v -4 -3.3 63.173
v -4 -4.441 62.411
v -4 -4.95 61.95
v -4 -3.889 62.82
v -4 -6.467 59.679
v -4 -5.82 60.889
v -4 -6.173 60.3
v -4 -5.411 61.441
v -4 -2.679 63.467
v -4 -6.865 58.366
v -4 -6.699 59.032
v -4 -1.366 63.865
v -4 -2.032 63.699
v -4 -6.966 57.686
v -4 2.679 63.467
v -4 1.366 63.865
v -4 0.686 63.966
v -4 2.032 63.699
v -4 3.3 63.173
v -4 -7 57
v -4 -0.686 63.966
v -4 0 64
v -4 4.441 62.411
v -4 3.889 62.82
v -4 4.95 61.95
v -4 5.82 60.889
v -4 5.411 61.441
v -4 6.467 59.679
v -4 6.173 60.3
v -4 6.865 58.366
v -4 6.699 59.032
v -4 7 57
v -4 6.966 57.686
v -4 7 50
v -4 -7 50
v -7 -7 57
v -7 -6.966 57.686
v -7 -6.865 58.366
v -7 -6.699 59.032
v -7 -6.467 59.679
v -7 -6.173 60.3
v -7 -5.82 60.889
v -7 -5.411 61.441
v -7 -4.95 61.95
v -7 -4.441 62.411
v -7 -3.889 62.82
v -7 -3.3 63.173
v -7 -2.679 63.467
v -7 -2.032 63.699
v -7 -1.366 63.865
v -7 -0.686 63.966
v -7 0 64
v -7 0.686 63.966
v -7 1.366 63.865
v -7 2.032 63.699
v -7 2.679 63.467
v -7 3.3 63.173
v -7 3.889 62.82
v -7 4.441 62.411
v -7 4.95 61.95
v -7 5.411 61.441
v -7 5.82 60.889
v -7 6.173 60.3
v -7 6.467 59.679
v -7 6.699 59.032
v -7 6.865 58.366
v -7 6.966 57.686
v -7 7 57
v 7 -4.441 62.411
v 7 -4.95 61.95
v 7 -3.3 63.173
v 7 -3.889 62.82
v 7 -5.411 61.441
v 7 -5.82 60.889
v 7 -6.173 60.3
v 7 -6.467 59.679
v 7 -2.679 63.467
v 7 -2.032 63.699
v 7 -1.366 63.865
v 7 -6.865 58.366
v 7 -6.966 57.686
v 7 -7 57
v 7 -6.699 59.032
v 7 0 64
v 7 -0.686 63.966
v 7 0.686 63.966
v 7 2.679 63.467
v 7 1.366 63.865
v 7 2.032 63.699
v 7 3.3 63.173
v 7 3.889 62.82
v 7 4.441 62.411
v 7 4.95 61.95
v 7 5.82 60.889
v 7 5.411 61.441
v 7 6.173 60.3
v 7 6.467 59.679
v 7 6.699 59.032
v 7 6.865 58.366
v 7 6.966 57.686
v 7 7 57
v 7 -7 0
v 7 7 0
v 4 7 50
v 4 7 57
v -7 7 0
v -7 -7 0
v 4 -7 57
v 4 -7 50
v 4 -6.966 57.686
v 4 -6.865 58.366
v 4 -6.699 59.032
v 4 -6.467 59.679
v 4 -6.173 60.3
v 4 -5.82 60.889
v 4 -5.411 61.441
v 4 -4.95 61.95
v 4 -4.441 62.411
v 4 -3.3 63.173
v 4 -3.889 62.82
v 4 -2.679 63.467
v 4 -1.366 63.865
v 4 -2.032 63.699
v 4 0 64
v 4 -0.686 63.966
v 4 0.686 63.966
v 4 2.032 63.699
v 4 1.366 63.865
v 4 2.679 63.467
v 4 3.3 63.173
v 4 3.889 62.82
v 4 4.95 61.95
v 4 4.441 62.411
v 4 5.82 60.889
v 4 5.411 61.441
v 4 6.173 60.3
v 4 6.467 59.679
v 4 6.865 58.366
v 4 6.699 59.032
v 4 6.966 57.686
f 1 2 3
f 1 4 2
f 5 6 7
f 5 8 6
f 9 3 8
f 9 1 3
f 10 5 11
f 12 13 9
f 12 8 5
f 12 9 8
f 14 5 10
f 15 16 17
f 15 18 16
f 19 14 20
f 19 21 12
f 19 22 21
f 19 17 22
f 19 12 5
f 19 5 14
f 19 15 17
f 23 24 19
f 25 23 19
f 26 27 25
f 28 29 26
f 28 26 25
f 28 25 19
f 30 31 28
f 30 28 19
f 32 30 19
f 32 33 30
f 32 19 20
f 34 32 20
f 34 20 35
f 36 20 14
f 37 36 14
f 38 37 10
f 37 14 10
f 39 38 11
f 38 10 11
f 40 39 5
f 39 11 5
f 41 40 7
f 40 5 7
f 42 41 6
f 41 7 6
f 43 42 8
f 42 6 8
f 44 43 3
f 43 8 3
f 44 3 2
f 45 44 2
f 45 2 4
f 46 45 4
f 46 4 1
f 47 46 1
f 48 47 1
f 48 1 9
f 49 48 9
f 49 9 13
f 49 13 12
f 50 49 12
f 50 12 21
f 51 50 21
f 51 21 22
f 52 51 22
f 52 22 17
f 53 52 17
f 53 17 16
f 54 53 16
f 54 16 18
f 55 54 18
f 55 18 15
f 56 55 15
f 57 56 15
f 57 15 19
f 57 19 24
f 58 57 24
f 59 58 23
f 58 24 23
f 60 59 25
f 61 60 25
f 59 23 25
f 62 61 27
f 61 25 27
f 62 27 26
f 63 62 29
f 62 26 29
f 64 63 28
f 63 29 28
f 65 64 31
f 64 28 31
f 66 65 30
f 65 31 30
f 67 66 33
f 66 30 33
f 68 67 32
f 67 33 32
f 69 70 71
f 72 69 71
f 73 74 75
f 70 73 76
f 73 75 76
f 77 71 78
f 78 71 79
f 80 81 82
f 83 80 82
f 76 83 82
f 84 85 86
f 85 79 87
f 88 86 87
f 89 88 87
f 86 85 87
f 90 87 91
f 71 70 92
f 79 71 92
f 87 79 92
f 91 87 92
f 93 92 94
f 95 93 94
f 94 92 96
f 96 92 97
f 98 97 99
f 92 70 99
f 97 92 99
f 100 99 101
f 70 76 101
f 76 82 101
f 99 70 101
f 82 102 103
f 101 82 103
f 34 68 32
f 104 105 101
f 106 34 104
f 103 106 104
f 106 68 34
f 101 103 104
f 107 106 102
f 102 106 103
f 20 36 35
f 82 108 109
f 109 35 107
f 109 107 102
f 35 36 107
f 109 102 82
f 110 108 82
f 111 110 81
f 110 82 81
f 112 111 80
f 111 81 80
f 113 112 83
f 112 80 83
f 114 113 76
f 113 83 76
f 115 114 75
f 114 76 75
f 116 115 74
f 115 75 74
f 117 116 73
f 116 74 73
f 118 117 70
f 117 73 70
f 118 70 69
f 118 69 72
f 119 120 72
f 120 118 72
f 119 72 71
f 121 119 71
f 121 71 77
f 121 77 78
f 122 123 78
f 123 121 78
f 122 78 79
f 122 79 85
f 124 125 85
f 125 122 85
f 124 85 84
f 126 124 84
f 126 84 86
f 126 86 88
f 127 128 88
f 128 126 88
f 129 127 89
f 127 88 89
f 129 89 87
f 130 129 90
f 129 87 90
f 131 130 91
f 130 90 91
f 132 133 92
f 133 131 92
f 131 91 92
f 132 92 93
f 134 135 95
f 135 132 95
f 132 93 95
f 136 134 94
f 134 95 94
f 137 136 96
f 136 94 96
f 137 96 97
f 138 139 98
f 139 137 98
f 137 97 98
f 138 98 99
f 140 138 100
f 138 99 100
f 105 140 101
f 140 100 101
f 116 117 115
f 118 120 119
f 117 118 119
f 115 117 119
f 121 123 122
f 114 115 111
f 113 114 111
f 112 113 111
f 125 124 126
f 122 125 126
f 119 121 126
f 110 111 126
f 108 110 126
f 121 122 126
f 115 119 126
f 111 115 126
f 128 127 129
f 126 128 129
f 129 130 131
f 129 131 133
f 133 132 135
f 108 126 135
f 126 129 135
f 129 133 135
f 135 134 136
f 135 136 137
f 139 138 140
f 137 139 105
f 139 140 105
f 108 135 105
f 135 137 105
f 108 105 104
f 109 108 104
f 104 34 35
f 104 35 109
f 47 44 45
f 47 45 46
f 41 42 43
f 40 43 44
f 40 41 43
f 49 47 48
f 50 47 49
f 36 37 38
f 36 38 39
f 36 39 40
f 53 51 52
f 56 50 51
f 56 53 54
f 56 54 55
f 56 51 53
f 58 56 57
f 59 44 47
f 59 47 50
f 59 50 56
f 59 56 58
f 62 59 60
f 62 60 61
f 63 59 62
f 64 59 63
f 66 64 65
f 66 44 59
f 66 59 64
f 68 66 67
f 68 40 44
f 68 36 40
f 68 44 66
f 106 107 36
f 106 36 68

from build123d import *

# Parameters (mm, degrees)
SKETCH_1_W          = 14
SKETCH_1_H          = 14
EXTRUDE_1_DEPTH     = 64
CUT_EXTRUDE_1_DEPTH = 64
SKETCH_3_W          = 8
SKETCH_3_H          = 14
CUT_EXTRUDE_2_DEPTH = 15


with BuildPart() as part:
    # 草图1 → 凸台-拉伸1 (new body)
    with BuildSketch(Plane.XY):
        Rectangle(SKETCH_1_W, SKETCH_1_H)
    extrude(amount=EXTRUDE_1_DEPTH)

    # 草图2 → 切除-拉伸1 (cut)
    with BuildSketch(Plane(origin=(7, 0, 0), x_dir=(0, 0, -1), z_dir=(1, 0, 0))):
        with BuildLine():
            Line((-57, 7), (-68.546767236, 7))
            Line((-68.546767236, 7), (-68.546767236, -7))
            Line((-68.546767236, -7), (-57, -7))
            ThreePointArc((-57, -7), (-64, 0), (-57, 7))
        make_face()
    extrude(amount=-CUT_EXTRUDE_1_DEPTH, mode=Mode.SUBTRACT)

    # 草图3 → 切除-拉伸2 (cut, through all)
    with BuildSketch(Plane(origin=(0, 7, 0), x_dir=(1, 0, 0), z_dir=(0, 1, 0))):
        with Locations((0, -57)):
            Rectangle(SKETCH_3_W, SKETCH_3_H)
    extrude(amount=-CUT_EXTRUDE_2_DEPTH, mode=Mode.SUBTRACT)


solid = part.part
